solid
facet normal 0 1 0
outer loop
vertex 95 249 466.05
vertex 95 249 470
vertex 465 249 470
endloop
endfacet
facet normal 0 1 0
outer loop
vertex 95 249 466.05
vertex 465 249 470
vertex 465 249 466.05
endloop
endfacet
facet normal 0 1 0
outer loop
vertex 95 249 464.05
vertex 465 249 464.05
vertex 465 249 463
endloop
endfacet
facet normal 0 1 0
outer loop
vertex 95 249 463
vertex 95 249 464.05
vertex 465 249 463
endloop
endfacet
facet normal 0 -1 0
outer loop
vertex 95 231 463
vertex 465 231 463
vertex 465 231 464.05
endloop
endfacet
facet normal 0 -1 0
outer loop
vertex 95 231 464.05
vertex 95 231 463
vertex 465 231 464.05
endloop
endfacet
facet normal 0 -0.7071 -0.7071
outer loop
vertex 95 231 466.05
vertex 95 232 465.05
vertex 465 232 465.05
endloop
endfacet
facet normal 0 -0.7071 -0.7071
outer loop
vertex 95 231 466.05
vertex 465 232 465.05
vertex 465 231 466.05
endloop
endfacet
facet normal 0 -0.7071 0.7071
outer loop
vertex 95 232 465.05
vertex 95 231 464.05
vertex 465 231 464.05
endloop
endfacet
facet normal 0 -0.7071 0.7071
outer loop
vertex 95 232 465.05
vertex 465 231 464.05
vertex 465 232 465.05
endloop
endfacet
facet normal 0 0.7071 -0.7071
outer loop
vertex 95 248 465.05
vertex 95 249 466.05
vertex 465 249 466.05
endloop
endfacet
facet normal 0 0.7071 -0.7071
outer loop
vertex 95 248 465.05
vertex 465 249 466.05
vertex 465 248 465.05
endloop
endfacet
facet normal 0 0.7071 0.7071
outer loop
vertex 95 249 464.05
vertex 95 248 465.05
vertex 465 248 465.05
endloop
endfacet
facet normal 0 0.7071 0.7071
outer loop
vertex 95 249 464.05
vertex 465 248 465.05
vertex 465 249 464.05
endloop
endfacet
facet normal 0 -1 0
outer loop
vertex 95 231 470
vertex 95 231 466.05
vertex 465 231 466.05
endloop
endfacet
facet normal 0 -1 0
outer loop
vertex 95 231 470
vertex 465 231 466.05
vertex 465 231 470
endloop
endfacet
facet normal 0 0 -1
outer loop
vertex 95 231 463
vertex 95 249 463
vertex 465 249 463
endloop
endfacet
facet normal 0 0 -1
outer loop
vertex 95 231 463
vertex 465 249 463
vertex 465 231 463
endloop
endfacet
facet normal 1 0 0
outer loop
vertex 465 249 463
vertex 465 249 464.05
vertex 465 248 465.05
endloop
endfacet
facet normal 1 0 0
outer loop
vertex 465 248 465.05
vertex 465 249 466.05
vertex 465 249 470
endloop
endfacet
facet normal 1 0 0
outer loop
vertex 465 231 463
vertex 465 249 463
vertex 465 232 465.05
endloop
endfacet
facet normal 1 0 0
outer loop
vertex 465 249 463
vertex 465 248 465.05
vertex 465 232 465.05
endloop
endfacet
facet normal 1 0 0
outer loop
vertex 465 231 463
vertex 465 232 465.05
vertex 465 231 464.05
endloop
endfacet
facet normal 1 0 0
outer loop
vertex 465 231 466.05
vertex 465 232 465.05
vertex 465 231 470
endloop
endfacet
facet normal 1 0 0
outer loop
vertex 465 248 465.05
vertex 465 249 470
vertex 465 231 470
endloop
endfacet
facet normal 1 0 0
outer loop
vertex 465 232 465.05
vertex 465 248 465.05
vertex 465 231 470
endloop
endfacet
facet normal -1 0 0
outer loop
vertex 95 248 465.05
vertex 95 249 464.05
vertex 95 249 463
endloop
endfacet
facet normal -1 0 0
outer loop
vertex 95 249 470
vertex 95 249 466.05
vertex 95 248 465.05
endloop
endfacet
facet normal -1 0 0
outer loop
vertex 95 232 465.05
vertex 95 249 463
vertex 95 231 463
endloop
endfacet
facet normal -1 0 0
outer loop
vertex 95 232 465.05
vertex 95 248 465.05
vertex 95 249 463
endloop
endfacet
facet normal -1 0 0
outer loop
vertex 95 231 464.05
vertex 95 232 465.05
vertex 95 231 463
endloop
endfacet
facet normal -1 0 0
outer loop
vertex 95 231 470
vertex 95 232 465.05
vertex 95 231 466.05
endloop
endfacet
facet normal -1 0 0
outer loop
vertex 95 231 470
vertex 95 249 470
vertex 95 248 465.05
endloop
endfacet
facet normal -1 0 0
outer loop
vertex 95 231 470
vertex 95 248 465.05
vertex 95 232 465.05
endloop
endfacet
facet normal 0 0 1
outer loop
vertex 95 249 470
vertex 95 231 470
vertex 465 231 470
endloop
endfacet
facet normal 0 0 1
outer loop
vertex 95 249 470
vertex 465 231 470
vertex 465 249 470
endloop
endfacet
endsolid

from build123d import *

# Parameters (mm, degrees)
EXTRUDE_1_DEPTH = 370


with BuildPart() as part:
    # 草图1 → 凸台-拉伸1 (new body)
    with BuildSketch(Plane(origin=(95, 0, 0), x_dir=(0, -1, 0), z_dir=(-1, 0, 0))):
        Polygon((-249, 463), (-231, 463), (-231, 464.05), (-232, 465.05), (-231, 466.05), (-231, 470), (-249, 470), (-249, 466.05), (-248, 465.05), (-249, 464.05), align=None)
    extrude(amount=-EXTRUDE_1_DEPTH)


solid = part.part
